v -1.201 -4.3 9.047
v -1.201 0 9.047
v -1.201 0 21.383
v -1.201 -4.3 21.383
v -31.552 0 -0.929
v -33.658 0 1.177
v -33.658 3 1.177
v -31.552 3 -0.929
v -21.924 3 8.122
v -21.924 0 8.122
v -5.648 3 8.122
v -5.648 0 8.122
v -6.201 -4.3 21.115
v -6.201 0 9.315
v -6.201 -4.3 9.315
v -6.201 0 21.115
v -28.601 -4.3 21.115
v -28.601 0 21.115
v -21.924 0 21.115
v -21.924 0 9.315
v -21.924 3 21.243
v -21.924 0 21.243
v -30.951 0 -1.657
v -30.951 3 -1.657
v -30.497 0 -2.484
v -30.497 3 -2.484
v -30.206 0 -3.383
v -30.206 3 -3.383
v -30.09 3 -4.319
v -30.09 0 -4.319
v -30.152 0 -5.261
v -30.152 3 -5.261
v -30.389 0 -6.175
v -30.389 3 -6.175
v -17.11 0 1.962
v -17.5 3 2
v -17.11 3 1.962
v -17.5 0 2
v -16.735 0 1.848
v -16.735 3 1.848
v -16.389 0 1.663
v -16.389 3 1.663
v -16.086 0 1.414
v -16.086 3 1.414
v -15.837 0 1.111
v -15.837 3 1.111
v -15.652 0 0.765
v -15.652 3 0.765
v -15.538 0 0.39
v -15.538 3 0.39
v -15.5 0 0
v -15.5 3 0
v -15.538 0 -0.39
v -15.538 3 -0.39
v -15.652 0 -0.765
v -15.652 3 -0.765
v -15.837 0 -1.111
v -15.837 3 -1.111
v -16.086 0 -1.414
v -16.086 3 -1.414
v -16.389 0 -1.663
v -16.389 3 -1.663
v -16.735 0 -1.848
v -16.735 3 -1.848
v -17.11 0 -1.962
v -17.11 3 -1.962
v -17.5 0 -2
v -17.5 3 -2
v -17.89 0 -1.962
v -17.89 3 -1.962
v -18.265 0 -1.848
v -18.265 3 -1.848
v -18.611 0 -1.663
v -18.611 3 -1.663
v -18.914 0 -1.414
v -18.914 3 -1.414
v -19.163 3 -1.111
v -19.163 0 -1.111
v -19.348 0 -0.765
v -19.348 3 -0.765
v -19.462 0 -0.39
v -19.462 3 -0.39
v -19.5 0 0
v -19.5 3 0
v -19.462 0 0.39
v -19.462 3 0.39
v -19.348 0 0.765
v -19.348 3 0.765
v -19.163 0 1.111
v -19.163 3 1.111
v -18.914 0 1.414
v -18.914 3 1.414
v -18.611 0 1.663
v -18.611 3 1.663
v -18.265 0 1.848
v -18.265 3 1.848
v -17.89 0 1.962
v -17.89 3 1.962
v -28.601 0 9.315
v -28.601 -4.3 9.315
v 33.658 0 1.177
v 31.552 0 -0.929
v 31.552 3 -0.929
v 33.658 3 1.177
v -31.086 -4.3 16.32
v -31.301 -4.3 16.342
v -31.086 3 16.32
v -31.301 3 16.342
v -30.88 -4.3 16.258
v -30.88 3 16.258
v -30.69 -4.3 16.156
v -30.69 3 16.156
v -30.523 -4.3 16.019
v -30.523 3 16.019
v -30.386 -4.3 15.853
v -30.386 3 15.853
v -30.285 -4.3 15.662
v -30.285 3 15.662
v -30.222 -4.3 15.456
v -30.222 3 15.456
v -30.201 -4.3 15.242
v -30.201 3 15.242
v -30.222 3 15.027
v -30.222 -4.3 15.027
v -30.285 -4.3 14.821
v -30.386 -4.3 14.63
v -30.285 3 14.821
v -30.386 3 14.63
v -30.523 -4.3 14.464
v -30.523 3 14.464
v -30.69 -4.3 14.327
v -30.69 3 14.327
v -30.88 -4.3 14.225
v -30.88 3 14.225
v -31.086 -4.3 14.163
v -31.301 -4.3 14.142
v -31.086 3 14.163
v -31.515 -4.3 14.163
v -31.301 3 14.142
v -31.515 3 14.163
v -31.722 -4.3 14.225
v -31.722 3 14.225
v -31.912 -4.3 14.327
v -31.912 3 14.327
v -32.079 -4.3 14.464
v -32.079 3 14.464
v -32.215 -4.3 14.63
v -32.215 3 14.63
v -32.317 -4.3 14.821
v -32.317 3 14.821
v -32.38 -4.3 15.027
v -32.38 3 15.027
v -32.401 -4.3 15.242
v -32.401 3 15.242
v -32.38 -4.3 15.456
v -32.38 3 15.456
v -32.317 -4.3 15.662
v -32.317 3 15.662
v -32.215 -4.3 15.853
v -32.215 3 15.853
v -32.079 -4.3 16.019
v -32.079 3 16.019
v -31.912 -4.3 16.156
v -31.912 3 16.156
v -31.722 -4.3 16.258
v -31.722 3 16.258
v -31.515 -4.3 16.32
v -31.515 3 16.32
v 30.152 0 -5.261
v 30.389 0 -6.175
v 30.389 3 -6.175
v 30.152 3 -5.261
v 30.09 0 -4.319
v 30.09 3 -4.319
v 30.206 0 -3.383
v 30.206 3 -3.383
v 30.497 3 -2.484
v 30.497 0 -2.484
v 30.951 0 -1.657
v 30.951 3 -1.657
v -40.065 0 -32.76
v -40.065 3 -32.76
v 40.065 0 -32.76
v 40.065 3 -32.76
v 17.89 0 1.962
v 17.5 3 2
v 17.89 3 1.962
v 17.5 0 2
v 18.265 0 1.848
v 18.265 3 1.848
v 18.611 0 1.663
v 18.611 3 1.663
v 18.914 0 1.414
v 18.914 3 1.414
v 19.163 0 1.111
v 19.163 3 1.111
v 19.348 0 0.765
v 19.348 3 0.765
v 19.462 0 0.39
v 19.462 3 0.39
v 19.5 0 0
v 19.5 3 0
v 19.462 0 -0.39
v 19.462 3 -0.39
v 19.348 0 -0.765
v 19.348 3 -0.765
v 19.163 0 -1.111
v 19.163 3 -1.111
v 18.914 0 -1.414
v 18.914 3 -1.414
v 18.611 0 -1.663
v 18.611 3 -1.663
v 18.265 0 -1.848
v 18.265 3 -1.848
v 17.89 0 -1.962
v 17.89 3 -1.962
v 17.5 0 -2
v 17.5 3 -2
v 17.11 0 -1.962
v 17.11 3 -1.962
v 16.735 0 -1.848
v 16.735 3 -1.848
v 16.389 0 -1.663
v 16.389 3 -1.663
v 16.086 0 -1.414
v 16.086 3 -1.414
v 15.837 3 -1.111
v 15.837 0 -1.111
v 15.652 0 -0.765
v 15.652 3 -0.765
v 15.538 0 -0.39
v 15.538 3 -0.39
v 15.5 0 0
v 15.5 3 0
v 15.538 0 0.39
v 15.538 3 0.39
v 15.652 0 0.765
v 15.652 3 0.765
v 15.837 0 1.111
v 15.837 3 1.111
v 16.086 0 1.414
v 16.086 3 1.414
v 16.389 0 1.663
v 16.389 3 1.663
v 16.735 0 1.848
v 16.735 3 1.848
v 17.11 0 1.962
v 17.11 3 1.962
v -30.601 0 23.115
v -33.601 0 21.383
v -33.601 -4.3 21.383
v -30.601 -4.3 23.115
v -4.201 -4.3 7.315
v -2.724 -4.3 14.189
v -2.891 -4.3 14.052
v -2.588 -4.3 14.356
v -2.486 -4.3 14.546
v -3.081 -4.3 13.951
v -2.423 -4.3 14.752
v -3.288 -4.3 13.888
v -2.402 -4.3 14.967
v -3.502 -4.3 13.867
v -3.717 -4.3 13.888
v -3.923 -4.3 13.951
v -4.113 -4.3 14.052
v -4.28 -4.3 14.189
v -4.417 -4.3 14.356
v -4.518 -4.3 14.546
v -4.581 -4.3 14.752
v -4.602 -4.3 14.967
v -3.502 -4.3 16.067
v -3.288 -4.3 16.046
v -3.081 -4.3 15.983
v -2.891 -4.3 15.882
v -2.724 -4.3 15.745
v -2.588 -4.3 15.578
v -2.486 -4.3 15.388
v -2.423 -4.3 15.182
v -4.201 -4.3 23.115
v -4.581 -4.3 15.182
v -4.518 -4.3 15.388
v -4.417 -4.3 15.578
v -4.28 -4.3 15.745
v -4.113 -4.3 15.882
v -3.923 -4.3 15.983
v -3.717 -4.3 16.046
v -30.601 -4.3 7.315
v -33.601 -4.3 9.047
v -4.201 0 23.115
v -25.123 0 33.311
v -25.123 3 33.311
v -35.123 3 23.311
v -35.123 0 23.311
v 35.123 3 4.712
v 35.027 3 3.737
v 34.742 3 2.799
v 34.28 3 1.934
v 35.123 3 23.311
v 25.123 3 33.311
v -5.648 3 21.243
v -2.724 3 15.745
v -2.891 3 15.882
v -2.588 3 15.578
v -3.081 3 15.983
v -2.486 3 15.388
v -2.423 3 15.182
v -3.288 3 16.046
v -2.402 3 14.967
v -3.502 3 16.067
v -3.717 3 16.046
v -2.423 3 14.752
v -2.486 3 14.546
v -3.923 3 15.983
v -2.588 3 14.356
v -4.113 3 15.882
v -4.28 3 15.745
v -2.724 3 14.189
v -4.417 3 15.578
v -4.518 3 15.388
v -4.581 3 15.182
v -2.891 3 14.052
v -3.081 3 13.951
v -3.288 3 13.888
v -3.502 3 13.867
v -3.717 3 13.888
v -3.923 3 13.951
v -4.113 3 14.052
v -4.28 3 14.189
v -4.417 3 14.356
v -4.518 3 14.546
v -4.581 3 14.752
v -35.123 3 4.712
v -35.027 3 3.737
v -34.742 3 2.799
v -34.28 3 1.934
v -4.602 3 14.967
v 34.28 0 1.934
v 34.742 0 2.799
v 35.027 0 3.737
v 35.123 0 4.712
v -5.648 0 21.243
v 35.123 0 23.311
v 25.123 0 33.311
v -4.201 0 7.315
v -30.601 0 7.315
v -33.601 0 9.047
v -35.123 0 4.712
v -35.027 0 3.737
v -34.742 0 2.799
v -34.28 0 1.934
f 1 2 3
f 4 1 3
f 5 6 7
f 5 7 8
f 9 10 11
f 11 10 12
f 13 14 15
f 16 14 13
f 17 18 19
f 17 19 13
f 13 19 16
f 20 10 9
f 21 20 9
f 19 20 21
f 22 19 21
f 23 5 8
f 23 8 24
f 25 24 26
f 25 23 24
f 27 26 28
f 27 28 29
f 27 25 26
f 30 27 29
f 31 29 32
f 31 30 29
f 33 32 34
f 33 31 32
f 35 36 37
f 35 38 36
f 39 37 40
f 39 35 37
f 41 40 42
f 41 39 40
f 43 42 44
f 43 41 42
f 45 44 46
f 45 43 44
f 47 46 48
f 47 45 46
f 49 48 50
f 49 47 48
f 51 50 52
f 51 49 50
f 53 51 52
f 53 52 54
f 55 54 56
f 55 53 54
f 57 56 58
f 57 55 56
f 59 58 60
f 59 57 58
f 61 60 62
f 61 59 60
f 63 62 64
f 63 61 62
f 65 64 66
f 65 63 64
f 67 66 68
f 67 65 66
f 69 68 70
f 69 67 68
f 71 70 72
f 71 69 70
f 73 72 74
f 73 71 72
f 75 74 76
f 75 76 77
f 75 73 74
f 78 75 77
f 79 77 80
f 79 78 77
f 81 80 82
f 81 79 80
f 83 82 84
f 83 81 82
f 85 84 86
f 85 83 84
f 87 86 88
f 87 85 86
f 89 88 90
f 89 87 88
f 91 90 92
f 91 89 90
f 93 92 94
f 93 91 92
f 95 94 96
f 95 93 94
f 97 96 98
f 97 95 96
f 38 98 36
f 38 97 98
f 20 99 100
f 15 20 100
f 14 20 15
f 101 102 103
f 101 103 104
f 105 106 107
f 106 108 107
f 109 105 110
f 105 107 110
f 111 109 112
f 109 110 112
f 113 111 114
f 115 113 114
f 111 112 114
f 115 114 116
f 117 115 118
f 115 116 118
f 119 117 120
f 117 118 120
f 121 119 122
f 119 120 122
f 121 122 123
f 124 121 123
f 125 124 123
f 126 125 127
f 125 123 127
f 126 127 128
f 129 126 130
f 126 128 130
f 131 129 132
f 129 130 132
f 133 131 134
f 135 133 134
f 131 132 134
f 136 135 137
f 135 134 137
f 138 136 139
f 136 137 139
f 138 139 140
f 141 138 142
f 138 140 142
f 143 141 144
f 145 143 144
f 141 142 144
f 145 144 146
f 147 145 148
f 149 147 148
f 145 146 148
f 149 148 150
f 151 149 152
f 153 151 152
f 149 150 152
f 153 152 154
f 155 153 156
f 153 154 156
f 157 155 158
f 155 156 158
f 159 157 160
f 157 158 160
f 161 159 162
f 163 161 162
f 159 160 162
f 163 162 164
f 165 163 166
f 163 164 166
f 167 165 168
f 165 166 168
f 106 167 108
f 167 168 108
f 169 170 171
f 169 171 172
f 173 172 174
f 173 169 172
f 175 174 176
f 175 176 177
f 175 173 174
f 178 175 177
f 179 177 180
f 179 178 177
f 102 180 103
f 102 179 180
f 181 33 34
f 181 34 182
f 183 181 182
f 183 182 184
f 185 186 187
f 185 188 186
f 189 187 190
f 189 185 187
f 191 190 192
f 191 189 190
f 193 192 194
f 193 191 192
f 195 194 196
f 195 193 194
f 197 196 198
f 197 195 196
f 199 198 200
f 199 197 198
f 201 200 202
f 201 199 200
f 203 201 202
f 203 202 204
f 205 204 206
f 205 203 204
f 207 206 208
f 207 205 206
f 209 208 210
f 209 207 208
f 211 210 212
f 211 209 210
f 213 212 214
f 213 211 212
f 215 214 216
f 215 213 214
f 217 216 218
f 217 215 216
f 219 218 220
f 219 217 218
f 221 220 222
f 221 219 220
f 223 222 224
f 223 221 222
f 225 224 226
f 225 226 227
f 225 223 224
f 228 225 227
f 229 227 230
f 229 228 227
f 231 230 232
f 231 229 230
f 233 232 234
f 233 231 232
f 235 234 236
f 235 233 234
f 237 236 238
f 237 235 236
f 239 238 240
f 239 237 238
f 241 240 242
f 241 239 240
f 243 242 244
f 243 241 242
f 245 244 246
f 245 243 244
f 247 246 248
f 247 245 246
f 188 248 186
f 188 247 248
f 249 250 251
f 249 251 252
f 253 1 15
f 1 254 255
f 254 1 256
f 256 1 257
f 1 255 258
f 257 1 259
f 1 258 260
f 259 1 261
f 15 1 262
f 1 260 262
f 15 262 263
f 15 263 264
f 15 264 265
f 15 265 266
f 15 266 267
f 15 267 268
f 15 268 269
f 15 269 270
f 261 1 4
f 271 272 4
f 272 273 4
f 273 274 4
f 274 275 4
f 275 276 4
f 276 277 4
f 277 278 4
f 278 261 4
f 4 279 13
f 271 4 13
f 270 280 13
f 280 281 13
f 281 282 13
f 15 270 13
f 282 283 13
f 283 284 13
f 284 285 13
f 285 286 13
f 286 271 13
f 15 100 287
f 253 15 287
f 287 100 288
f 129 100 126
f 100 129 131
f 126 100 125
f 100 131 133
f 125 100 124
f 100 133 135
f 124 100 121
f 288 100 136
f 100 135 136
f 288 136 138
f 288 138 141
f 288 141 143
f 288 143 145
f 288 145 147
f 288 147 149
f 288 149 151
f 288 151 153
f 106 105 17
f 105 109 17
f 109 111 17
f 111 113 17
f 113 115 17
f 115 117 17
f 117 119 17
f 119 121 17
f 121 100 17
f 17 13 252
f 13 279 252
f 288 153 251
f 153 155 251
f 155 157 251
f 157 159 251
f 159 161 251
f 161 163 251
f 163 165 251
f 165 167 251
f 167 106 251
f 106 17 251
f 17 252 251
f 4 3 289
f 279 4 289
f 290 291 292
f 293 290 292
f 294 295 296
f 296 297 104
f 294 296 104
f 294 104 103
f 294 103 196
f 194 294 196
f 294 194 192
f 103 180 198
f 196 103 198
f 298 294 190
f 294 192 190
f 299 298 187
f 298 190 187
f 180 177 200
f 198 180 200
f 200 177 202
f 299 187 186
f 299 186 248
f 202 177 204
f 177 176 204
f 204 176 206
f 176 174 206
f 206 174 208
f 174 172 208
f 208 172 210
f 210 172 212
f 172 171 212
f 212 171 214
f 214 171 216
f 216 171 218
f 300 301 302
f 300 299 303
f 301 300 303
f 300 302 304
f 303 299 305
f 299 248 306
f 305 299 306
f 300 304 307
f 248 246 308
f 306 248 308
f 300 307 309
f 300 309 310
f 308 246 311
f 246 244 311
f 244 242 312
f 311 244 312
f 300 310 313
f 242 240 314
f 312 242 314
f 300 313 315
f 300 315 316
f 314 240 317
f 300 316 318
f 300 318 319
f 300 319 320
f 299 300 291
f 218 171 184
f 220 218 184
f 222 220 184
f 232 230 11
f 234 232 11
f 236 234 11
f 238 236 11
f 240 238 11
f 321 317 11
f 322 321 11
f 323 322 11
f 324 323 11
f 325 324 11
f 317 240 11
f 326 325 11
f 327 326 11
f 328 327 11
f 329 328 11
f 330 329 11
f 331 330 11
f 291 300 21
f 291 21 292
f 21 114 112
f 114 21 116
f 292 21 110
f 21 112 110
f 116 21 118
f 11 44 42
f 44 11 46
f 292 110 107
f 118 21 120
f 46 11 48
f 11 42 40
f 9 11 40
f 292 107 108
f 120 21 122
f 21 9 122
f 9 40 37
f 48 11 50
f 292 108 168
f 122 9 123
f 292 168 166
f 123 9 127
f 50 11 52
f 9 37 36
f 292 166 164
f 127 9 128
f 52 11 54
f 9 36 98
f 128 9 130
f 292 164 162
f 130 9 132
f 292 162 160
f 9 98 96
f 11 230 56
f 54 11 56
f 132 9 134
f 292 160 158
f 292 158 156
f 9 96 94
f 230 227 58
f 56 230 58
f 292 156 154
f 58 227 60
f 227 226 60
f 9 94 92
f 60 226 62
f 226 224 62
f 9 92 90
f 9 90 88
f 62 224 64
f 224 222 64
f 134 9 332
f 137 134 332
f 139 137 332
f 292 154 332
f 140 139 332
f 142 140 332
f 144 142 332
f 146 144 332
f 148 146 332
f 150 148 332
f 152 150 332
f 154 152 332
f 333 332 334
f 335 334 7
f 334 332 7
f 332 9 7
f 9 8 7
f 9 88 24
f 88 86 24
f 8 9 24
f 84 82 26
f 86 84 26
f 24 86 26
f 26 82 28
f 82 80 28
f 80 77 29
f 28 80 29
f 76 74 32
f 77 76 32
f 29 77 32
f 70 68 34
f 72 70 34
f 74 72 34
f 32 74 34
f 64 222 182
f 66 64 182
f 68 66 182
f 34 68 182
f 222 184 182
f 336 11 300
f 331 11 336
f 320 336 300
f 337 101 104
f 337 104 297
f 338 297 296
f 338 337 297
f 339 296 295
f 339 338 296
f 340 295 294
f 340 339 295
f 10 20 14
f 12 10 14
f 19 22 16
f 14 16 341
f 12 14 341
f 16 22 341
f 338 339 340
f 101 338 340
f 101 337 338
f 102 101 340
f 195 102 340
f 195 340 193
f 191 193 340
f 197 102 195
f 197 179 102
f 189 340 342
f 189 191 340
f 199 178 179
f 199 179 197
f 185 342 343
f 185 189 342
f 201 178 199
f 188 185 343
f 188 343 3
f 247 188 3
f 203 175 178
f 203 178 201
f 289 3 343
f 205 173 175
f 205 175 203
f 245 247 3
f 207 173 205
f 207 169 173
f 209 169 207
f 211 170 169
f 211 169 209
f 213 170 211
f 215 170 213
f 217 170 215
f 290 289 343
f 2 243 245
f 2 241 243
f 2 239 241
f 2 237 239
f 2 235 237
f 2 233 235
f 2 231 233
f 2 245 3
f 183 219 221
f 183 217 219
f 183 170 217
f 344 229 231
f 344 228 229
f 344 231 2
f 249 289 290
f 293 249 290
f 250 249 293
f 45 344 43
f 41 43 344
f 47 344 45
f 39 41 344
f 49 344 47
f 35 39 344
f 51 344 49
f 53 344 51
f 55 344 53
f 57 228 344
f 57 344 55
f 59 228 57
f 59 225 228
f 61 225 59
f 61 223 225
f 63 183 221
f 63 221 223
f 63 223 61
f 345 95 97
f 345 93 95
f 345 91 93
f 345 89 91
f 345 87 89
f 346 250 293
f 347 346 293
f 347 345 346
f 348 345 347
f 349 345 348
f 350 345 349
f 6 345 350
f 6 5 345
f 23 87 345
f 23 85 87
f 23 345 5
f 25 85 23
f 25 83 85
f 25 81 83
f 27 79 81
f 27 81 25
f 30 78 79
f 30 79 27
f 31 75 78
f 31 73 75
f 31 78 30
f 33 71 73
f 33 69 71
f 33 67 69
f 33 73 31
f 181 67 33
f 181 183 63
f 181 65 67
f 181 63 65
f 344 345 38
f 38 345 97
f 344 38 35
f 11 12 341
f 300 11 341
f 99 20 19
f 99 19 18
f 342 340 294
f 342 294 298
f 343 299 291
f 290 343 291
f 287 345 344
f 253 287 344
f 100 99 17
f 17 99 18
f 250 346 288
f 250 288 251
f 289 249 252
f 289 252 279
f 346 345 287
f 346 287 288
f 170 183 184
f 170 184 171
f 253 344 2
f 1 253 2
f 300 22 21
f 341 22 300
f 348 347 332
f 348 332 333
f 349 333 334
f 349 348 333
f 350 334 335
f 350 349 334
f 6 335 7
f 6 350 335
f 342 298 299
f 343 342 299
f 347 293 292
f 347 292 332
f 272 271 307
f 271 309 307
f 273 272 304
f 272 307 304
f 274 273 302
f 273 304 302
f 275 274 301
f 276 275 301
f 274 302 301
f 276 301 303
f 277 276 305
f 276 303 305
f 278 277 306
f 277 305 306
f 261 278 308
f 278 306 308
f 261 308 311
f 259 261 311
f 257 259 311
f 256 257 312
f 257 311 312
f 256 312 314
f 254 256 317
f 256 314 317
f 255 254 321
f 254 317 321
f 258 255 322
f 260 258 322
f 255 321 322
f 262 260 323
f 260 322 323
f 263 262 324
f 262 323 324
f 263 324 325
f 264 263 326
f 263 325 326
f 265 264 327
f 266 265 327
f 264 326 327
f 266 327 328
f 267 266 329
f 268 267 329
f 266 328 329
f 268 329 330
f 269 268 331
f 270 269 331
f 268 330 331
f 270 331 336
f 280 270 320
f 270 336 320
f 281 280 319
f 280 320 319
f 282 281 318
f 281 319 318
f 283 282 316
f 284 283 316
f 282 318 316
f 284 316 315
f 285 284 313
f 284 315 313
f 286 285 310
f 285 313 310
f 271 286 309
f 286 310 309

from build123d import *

# Parameters (mm, degrees)
BOSS_EXTRUDE1_DEPTH = 3
SKETCH2_R           = 2
BOSS_EXTRUDE2_DEPTH = 10
SKETCH3_R           = 1.1
CUT_EXTRUDE1_DEPTH  = 10
SKETCH4_W           = 26.4
SKETCH4_H           = 15.8
SKETCH4_W_2         = 22.4
SKETCH4_H_2         = 11.8
BOSS_EXTRUDE3_DEPTH = 4.3
BOSS_EXTRUDE4_DEPTH = 4.3
SKETCH6_R           = 1.1
CUT_EXTRUDE2_DEPTH  = 20.3
SKETCH7_W           = 16.276669309
SKETCH7_H           = 13.12120508
CUT_EXTRUDE3_DEPTH  = 20.3
BOSS_EXTRUDE5_DEPTH = 3
CUT_EXTRUDE4_START  = -21
SKETCH10_R          = 2
CUT_EXTRUDE4_DEPTH  = 21


with BuildPart() as part:
    # Sketch1 → Boss-Extrude1 (new body)
    with BuildSketch(Plane(origin=(0, 0, 0), x_dir=(1, 0, 0), z_dir=(0, 1, 0))):
        with BuildLine():
            Line((-30.38926404, 6.174917902), (-40.065448474, 32.76001614))
            Line((-40.065448474, 32.76001614), (40.065448474, 32.76001614))
            Line((40.065448474, 32.76001614), (30.38926404, 6.174917902))
            ThreePointArc((30.38926404, 6.174917902), (30.206247108, 3.382619115), (31.552193238, 0.929283279))
            Line((31.552193238, 0.929283279), (33.658129878, -1.17665336))
            ThreePointArc((33.658129878, -1.17665336), (34.741993634, -2.798770105), (35.122595972, -4.712187266))
            Line((35.122595972, -4.712187266), (35.122595972, -23.310725409))
            Line((35.122595972, -23.310725409), (-35.122595972, -23.310725409))
            Line((-35.122595972, -23.310725409), (-35.122595972, -4.712187266))
            ThreePointArc((-35.122595972, -4.712187266), (-34.741993634, -2.798770105), (-33.658129878, -1.17665336))
            Line((-33.658129878, -1.17665336), (-31.552193238, 0.929283279))
            ThreePointArc((-31.552193238, 0.929283279), (-30.206247108, 3.382619115), (-30.38926404, 6.174917902))
        make_face()
    extrude(amount=BOSS_EXTRUDE1_DEPTH)

    # Sketch2 → Boss-Extrude2 (add)
    with BuildSketch(Plane(origin=(0, 3, 0), x_dir=(1, 0, 0), z_dir=(0, 1, 0))):
        with Locations(Location((17.5, 0, 0), (0, 0, 270))):
            Circle(SKETCH2_R)
        with Locations(Location((-17.5, 0, 0), (0, 0, 270))):
            Circle(SKETCH2_R)
    extrude(amount=BOSS_EXTRUDE2_DEPTH)

    # Sketch3 → Cut-Extrude1 (cut)
    with BuildSketch(Plane(origin=(0, 3, 0), x_dir=(1, 0, 0), z_dir=(0, 1, 0))):
        with Locations(Location((-31.300794494, -15.24150981, 0), (0, 0, 270))):
            Circle(SKETCH3_R)
        with Locations(Location((-3.502149082, -14.967077195, 0), (0, 0, 270))):
            Circle(SKETCH3_R)
    extrude(amount=-CUT_EXTRUDE1_DEPTH, mode=Mode.SUBTRACT)

    # Sketch4 → Boss-Extrude3 (add)
    with BuildSketch(Plane.XZ):
        with Locations((-17.401471788, 15.214861671)):
            Rectangle(SKETCH4_W, SKETCH4_H)
        with Locations((-17.401471788, 15.214861671)):
            Rectangle(SKETCH4_W_2, SKETCH4_H_2, mode=Mode.SUBTRACT)
    extrude(amount=BOSS_EXTRUDE3_DEPTH)

    # Sketch5 → Boss-Extrude4 (add)
    with BuildSketch(Plane.XZ):
        Polygon((-30.601471788, 23.114861671), (-30.601471788, 7.314861671), (-33.601471788, 9.046912478), (-33.601471788, 21.382810863), align=None)
        Polygon((-1.201471788, 21.382810863), (-4.201471788, 23.114861671), (-4.201471788, 7.314861671), (-1.201471788, 9.046912478), align=None)
    extrude(amount=BOSS_EXTRUDE4_DEPTH)

    # Sketch6 → Cut-Extrude2 (cut)
    with BuildSketch(Plane(origin=(0, 3, 0), x_dir=(1, 0, 0), z_dir=(0, 1, 0))):
        with Locations(Location((-31.300794494, -15.24150981, 0), (0, 0, 270))):
            Circle(SKETCH6_R)
        with Locations(Location((-3.502149082, -14.967077195, 0), (0, 0, 270))):
            Circle(SKETCH6_R)
    extrude(amount=-CUT_EXTRUDE2_DEPTH, mode=Mode.SUBTRACT)

    # Sketch7 → Cut-Extrude3 (cut)
    with BuildSketch(Plane.XZ):
        with Locations((-13.786077898, 14.682620826)):
            Rectangle(SKETCH7_W, SKETCH7_H)
    extrude(amount=-CUT_EXTRUDE3_DEPTH, mode=Mode.SUBTRACT)

    # Sketch8 → Boss-Extrude5 (add)
    with BuildSketch(Plane(origin=(0, 3, 0), x_dir=(1, 0, 0), z_dir=(0, 1, 0))):
        Polygon((-35.122595972, -23.310725409), (35.122595972, -23.310725409), (25.122595972, -33.310725409), (-25.122595972, -33.310725409), align=None)
    extrude(amount=-BOSS_EXTRUDE5_DEPTH)

    # Sketch10 → Cut-Extrude4 (cut)
    with BuildSketch(Plane(origin=(0, 13, 0), x_dir=(1, 0, 0), z_dir=(0, 1, 0)).offset(CUT_EXTRUDE4_START)):
        with Locations(Location((-17.5, 0, 0), (0, 0, 270))):
            Circle(SKETCH10_R)
        with Locations(Location((17.5, 0, 0), (0, 0, 270))):
            Circle(SKETCH10_R)
    extrude(amount=CUT_EXTRUDE4_DEPTH, mode=Mode.SUBTRACT)


solid = part.part
